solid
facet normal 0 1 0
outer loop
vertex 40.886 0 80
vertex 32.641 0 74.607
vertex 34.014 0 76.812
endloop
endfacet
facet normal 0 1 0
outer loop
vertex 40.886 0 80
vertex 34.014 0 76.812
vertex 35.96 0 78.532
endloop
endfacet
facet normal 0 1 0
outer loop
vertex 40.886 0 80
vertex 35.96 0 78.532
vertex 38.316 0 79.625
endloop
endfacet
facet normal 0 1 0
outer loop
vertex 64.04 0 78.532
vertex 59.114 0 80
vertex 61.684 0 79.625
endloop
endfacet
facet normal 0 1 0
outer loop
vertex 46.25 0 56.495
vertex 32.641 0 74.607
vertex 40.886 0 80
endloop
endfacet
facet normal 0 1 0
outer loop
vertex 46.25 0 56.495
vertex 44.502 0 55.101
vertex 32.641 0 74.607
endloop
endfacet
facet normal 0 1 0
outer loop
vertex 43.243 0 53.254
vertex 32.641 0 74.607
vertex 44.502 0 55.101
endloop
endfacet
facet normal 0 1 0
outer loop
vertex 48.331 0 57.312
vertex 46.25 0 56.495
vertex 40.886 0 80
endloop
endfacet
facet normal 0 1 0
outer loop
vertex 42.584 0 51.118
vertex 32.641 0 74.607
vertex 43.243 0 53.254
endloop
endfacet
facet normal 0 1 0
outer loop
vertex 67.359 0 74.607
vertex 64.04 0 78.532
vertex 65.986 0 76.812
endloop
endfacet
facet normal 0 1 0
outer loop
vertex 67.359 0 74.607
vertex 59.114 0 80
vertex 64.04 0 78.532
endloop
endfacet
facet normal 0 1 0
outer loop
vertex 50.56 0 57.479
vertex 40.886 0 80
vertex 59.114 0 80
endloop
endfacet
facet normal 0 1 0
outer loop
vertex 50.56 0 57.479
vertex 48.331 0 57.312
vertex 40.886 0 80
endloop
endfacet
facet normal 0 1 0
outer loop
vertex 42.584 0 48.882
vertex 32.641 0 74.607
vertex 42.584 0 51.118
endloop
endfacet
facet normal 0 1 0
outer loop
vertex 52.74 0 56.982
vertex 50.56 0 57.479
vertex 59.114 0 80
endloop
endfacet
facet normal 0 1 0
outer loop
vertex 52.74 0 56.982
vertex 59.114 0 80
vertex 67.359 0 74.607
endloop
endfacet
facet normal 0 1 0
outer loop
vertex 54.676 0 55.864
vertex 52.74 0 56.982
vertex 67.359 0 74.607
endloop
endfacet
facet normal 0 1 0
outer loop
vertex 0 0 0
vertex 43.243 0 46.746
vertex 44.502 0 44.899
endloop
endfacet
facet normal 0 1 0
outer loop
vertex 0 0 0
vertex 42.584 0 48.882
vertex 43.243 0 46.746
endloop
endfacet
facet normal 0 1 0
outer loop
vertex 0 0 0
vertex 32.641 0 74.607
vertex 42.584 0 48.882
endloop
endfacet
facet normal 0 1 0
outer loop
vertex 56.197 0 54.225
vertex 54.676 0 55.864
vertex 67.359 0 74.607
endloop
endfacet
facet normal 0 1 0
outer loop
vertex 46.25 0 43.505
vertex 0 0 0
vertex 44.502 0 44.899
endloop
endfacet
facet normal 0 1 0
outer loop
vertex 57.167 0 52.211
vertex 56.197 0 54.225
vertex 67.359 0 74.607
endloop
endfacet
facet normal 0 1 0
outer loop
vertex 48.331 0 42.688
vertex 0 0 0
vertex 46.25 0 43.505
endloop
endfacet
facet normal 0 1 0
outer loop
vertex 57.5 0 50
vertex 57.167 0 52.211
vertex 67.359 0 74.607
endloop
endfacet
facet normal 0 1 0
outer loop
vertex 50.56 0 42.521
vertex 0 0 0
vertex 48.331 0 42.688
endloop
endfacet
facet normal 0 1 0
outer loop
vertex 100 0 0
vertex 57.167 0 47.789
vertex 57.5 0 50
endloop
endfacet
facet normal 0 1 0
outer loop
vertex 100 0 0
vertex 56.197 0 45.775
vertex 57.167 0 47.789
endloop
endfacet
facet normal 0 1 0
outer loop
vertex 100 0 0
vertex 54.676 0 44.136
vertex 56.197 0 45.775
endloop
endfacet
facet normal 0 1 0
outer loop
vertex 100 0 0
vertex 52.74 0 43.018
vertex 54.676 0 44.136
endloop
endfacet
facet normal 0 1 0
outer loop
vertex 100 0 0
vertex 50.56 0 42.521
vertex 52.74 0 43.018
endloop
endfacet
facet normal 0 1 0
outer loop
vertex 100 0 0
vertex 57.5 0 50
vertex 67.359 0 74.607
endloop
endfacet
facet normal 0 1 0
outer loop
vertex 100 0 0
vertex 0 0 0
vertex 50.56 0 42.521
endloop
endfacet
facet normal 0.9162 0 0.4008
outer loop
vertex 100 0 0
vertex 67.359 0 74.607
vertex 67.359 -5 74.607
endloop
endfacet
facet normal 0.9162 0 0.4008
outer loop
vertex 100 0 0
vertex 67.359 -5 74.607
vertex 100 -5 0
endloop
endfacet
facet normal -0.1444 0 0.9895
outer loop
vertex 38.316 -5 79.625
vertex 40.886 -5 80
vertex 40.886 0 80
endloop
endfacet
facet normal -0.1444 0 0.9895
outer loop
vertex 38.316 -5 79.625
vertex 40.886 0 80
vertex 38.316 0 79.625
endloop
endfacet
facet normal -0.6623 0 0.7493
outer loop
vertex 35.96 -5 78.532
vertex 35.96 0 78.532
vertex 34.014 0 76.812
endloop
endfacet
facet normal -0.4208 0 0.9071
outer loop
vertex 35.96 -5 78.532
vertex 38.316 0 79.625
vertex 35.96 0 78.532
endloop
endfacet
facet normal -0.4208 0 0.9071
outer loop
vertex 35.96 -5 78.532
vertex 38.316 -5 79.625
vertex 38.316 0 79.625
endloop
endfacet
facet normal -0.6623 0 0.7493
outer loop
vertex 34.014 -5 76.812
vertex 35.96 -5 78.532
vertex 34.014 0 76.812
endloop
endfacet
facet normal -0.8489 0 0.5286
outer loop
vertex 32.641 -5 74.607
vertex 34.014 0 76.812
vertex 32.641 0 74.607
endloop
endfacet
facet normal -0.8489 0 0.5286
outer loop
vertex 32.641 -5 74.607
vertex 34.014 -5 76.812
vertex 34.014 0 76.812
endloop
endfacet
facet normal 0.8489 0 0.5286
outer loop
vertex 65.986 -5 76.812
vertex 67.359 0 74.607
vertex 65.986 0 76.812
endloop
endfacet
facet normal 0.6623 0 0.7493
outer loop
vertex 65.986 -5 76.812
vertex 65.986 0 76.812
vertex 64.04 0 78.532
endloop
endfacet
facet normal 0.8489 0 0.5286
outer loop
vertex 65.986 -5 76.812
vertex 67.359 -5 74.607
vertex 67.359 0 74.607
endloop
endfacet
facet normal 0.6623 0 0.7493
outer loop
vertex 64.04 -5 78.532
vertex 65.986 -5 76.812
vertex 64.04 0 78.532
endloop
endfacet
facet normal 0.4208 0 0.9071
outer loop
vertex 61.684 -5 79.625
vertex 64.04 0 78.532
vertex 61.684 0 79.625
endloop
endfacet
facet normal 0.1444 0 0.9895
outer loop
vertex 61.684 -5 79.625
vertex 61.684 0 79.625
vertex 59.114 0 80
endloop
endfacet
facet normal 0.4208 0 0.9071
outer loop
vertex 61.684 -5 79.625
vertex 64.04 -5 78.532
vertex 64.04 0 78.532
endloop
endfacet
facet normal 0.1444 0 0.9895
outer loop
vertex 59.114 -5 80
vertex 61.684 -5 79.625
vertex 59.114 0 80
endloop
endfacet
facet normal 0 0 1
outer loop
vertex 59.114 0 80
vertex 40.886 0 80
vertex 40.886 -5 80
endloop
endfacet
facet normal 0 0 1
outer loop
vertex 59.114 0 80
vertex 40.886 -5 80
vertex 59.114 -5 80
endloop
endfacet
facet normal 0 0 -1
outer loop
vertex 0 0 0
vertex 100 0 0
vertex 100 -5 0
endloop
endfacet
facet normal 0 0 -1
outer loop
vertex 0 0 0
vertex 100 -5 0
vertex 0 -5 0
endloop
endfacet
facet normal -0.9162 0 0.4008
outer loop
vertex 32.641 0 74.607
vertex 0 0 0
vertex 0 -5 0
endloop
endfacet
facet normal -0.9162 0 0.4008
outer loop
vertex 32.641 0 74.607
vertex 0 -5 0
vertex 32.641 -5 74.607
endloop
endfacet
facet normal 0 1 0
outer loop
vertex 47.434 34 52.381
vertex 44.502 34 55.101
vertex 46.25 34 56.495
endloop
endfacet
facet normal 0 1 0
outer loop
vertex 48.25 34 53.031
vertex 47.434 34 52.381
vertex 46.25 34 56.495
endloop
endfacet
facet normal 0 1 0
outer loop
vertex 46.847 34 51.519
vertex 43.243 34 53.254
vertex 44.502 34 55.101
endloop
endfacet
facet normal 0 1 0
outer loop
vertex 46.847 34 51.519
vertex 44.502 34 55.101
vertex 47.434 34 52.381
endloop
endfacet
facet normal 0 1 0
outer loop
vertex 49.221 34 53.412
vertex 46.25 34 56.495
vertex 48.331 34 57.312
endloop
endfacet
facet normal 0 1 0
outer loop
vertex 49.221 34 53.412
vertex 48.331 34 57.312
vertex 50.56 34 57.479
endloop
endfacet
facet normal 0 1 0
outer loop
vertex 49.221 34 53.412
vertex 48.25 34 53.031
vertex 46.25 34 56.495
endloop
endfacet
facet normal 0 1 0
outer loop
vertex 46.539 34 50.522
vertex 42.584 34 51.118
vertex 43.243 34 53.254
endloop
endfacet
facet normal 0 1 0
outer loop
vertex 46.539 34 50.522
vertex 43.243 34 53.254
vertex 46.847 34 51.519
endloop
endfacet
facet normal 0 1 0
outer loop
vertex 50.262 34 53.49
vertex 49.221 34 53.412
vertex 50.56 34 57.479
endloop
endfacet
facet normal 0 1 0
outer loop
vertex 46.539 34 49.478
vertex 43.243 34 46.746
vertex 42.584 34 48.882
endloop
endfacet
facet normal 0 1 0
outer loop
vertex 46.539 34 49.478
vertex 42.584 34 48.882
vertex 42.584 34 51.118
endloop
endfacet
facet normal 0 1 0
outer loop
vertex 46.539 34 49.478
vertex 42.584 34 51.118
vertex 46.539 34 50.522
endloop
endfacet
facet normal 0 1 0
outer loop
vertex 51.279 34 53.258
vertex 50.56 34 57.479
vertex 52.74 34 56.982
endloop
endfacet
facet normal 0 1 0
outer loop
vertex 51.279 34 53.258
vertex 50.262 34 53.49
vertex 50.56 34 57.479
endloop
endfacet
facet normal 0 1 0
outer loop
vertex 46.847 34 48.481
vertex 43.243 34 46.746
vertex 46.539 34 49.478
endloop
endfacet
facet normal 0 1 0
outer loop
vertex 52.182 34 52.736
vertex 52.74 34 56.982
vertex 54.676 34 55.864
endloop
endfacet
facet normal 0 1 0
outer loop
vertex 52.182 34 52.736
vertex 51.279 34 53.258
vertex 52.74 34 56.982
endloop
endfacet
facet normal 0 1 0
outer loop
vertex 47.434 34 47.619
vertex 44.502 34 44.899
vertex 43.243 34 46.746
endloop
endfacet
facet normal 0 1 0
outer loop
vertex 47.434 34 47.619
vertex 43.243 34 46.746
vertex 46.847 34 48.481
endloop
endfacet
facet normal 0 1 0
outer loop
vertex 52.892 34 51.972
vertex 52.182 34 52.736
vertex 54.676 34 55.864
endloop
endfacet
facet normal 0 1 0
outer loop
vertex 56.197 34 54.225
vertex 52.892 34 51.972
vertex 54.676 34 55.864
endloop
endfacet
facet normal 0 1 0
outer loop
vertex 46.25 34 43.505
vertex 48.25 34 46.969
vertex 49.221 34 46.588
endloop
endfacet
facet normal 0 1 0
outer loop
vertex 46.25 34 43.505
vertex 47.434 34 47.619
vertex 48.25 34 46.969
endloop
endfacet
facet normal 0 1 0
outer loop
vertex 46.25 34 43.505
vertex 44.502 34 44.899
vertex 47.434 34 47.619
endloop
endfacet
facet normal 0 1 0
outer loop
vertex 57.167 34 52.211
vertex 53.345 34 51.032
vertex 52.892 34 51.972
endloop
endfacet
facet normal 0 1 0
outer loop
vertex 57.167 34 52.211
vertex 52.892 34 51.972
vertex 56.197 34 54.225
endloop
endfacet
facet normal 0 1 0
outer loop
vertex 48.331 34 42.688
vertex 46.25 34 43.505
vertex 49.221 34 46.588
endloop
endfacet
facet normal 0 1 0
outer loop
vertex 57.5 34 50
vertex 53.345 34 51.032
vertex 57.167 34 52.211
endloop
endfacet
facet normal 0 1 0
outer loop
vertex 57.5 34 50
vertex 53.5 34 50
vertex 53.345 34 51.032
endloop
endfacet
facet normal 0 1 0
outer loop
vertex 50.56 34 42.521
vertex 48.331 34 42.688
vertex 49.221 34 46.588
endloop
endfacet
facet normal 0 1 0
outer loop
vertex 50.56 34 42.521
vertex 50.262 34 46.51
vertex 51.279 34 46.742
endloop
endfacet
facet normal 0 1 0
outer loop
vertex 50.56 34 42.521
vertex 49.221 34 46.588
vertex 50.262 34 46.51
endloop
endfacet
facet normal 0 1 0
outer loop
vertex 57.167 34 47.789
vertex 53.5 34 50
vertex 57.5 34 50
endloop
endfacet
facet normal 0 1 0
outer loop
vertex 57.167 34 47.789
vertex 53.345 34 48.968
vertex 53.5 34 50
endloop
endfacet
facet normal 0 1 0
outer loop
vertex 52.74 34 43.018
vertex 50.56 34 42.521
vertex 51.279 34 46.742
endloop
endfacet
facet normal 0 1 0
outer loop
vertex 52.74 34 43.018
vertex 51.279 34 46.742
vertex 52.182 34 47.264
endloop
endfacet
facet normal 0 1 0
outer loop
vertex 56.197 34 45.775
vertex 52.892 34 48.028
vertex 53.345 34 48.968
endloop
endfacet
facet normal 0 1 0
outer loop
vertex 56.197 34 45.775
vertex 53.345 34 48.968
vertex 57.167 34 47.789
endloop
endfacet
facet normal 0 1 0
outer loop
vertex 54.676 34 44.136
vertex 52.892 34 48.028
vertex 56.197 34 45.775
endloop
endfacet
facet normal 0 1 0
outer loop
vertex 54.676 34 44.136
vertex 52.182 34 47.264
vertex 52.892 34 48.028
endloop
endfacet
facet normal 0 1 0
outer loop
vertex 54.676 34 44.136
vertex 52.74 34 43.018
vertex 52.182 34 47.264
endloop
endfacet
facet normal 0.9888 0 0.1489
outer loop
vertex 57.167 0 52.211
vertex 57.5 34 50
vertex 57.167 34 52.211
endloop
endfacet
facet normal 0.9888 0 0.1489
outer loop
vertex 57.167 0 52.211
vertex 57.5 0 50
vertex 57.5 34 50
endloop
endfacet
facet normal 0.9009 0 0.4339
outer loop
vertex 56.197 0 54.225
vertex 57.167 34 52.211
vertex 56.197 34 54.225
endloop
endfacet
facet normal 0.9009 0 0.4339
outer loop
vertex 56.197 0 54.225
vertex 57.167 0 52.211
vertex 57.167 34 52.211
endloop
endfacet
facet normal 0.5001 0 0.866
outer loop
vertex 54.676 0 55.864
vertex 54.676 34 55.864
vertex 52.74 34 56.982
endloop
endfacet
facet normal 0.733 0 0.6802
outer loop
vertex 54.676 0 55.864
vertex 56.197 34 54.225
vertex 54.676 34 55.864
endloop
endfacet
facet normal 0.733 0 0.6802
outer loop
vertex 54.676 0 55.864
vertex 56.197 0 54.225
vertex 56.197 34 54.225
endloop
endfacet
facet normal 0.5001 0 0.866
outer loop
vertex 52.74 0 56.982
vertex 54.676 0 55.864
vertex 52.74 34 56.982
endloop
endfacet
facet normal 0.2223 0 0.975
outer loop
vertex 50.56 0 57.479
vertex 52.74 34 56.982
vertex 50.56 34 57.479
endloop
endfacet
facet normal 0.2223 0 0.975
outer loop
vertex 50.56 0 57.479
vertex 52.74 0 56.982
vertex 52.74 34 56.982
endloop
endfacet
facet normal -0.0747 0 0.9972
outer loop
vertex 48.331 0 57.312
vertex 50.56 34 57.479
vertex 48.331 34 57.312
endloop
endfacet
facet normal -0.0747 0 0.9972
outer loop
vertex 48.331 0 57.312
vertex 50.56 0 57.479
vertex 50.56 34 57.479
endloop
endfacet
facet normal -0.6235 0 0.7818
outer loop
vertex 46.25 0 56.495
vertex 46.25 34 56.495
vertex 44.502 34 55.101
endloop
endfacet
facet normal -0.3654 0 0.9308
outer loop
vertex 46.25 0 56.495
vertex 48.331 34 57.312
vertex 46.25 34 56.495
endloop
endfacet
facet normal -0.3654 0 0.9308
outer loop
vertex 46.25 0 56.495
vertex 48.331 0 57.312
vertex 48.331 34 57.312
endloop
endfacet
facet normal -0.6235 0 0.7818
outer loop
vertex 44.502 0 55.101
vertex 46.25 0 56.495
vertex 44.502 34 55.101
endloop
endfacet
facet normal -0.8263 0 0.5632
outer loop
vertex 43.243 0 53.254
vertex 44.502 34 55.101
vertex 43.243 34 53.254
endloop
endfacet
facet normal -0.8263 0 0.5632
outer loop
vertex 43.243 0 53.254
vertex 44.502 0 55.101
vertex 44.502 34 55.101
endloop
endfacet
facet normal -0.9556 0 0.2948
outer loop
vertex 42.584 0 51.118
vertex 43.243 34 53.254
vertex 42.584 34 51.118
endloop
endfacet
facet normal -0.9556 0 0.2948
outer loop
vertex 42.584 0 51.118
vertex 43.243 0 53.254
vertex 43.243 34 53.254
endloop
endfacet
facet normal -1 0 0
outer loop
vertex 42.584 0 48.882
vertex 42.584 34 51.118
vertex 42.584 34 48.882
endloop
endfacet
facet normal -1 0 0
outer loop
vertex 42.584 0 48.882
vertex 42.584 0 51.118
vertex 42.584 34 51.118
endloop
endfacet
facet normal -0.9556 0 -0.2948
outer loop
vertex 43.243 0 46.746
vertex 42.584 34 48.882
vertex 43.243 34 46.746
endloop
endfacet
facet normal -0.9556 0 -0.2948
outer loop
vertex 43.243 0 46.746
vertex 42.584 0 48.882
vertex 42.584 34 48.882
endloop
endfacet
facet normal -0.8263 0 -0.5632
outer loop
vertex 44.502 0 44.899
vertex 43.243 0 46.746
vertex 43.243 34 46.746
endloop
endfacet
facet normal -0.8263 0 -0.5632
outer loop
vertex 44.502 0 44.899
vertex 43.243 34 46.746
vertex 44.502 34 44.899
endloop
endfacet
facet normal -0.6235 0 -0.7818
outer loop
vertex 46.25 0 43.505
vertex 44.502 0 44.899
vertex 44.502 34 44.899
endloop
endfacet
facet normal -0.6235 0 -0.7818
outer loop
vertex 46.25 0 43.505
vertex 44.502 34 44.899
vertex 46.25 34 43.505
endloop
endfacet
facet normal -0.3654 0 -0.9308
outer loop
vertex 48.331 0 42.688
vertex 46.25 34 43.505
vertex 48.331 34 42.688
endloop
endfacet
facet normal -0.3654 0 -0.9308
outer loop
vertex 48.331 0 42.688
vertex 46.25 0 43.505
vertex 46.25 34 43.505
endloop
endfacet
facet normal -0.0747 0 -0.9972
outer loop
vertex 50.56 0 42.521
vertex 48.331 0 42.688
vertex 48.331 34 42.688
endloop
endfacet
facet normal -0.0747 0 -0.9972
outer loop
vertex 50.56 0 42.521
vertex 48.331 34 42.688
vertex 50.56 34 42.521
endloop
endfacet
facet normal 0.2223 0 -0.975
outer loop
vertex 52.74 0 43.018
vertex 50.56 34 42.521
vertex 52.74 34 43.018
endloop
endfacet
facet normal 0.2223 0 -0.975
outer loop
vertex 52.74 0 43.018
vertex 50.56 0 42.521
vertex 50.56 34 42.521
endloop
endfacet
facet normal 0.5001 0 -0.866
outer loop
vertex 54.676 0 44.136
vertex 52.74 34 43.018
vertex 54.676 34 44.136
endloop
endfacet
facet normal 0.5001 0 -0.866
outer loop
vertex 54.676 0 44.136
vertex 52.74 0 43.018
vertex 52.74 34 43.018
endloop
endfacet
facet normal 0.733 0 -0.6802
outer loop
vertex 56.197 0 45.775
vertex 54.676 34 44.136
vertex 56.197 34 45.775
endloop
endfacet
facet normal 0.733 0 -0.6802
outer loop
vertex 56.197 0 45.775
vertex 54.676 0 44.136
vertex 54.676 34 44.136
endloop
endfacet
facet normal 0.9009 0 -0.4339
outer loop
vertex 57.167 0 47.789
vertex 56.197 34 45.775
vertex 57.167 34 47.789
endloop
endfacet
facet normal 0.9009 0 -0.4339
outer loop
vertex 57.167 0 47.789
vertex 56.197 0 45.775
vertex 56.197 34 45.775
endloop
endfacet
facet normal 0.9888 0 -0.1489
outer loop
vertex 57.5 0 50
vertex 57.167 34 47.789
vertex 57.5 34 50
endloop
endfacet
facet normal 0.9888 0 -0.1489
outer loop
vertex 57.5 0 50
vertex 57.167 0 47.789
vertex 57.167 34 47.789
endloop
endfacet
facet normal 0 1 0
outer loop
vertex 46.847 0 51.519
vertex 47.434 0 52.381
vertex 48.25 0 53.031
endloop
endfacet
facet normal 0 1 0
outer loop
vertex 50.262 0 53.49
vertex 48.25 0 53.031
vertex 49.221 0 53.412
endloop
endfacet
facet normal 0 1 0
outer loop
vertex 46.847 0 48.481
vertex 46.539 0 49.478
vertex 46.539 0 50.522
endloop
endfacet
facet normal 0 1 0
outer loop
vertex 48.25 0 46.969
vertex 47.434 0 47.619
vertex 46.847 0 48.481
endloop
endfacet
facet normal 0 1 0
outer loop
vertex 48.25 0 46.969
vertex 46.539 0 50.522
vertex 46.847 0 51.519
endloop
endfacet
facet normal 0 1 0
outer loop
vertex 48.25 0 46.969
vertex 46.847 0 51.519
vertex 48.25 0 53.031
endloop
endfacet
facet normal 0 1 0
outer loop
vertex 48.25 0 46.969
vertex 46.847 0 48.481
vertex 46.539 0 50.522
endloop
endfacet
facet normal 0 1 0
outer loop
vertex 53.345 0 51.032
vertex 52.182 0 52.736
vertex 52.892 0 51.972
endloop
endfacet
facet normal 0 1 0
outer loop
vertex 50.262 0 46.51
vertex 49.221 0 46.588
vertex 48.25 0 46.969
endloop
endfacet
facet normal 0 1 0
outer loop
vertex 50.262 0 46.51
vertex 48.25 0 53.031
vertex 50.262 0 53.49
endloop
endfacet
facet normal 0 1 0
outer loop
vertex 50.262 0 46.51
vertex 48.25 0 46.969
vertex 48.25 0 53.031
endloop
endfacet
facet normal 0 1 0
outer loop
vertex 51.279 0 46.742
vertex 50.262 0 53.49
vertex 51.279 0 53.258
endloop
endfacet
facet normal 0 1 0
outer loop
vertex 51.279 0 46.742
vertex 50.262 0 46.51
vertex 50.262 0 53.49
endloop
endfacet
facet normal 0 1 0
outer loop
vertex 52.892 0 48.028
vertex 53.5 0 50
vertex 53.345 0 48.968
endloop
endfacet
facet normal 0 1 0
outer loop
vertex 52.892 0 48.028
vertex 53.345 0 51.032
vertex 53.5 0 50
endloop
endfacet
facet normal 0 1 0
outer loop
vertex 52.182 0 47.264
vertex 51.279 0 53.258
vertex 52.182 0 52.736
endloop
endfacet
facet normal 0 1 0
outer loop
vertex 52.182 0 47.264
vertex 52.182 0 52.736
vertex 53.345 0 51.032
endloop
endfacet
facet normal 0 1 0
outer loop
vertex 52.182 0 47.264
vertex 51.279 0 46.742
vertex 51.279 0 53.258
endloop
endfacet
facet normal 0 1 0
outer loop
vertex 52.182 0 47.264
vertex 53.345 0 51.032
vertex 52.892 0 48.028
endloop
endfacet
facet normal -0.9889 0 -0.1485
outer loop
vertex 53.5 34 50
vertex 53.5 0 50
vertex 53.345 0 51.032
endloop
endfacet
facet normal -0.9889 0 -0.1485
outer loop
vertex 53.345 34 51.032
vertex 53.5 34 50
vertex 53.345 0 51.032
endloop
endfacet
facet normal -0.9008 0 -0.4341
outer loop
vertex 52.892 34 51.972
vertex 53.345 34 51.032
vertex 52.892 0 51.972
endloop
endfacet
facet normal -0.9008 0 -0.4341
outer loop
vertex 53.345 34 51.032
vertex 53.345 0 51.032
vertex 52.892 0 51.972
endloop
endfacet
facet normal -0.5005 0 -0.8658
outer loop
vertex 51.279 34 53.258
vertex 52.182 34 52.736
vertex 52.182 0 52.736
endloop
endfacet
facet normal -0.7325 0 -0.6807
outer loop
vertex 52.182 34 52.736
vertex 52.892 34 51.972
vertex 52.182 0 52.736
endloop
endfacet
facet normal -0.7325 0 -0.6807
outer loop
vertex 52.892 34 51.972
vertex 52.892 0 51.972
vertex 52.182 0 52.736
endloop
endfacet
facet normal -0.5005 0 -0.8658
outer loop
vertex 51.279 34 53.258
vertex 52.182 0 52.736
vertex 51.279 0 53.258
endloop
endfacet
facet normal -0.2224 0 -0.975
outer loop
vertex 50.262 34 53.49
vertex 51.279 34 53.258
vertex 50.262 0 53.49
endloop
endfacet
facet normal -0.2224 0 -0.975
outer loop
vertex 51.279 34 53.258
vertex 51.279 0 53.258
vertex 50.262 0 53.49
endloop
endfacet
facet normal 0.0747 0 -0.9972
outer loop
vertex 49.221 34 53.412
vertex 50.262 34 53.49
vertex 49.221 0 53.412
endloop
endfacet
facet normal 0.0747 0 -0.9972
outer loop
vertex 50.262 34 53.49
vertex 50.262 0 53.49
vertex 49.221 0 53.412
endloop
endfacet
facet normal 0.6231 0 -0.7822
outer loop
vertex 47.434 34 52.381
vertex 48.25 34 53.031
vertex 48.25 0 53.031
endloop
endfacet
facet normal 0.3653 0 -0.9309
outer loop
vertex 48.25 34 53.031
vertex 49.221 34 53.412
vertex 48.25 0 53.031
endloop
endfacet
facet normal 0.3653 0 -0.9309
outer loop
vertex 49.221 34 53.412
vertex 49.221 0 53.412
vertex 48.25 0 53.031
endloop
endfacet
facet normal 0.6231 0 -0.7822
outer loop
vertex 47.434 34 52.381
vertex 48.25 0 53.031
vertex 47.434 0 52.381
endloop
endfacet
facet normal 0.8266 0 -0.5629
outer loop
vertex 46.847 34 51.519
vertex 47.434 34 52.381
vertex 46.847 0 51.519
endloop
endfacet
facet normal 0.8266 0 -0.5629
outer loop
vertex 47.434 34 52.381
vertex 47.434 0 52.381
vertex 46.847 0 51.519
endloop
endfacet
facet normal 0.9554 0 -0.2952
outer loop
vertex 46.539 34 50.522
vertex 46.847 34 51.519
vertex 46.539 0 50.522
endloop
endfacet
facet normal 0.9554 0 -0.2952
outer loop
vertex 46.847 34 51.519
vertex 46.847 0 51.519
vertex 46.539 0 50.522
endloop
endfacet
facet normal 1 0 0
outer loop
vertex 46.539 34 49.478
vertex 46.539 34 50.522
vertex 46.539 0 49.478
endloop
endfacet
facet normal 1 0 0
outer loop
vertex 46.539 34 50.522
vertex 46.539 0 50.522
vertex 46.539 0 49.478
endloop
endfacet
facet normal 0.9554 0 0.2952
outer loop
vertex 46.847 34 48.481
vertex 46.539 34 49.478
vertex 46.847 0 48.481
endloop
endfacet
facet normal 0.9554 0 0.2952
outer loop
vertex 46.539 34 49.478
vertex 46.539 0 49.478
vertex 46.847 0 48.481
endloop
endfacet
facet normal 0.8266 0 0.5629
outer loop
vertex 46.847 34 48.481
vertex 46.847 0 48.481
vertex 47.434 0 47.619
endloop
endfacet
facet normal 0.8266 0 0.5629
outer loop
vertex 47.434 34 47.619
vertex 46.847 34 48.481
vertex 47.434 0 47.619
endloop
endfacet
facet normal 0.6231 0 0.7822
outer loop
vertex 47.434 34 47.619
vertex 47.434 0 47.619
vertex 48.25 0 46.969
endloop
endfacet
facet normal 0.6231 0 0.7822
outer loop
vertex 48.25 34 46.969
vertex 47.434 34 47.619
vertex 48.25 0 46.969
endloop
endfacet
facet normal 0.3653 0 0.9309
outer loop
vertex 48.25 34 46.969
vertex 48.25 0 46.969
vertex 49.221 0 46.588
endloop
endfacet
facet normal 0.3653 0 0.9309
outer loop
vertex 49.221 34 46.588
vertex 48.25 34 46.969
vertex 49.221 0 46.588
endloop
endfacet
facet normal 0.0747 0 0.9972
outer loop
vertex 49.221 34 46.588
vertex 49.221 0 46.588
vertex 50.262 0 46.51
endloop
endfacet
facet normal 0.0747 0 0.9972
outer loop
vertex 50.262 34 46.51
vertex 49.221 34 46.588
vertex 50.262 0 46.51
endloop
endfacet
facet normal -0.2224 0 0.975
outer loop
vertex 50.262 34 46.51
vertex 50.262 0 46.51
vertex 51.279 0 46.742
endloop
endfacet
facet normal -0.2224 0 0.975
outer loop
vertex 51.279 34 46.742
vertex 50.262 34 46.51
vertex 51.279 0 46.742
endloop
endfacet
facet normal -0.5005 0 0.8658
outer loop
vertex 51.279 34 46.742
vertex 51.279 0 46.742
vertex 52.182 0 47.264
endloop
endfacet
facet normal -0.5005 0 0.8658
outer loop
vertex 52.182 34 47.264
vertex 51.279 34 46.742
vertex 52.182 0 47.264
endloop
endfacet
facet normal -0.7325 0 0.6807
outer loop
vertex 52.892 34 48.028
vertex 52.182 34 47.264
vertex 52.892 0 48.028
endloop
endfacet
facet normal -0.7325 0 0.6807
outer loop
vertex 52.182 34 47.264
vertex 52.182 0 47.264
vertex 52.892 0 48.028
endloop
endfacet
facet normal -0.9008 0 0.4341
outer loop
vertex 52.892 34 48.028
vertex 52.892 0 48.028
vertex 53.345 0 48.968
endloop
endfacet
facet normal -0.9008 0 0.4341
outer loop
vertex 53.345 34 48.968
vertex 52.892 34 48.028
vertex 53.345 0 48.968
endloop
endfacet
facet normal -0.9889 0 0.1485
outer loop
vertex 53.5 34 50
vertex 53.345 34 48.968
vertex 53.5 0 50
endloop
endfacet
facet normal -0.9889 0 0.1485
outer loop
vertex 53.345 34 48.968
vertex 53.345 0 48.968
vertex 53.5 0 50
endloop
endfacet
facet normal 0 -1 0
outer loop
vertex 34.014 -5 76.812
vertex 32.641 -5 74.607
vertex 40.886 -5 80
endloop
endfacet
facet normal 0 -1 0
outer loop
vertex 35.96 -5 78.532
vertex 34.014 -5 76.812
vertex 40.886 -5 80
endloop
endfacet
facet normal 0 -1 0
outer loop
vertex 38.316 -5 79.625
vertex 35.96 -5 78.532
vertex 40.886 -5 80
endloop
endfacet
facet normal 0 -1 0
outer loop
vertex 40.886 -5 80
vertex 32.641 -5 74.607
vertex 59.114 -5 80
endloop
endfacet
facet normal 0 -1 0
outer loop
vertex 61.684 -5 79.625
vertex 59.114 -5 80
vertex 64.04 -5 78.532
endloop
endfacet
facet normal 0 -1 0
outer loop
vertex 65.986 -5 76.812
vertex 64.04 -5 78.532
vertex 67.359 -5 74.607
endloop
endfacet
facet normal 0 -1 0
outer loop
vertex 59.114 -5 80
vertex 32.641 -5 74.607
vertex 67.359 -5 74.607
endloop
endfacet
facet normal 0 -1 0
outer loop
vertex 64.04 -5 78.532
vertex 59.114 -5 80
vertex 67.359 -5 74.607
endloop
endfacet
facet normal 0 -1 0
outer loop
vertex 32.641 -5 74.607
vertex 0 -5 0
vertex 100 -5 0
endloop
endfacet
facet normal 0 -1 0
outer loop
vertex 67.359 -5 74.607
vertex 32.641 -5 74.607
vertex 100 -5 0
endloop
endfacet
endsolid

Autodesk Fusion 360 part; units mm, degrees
sketch "Sketch1" plane through (0, 0, 0) normal (0, 1, 0) x (1, 0, 0)
  line L0 (0, 0) -> (35, -80)
  line L1 (35, -80) -> (65, -80)
  line L2 (65, -80) -> (100, 0)
  line L3 (100, 0) -> (0, 0)
  circle A0 centre (50, -50) radius 7.5
  circle A1 centre (50, -50) radius 3.5
  dimension "d1" = 100
  dimension "d2" = 30
  dimension "d4" = 80
  dimension "d5" = 35
  dimension "d6" = 50
  dimension "d7" = 15
  dimension "d8" = 15
  dimension "d13" = 7
extrude "Extrude1" add sketch "Sketch1" against normal blind 5 contours L0 L1 L2 L3 | A0 | A1
extrude "Extrude2" add sketch "Sketch1" along normal blind 34 contours A0
fillet "Fillet1" radius 9 2 edges at (65, -2.5, 80) (35, -2.5, 80)
